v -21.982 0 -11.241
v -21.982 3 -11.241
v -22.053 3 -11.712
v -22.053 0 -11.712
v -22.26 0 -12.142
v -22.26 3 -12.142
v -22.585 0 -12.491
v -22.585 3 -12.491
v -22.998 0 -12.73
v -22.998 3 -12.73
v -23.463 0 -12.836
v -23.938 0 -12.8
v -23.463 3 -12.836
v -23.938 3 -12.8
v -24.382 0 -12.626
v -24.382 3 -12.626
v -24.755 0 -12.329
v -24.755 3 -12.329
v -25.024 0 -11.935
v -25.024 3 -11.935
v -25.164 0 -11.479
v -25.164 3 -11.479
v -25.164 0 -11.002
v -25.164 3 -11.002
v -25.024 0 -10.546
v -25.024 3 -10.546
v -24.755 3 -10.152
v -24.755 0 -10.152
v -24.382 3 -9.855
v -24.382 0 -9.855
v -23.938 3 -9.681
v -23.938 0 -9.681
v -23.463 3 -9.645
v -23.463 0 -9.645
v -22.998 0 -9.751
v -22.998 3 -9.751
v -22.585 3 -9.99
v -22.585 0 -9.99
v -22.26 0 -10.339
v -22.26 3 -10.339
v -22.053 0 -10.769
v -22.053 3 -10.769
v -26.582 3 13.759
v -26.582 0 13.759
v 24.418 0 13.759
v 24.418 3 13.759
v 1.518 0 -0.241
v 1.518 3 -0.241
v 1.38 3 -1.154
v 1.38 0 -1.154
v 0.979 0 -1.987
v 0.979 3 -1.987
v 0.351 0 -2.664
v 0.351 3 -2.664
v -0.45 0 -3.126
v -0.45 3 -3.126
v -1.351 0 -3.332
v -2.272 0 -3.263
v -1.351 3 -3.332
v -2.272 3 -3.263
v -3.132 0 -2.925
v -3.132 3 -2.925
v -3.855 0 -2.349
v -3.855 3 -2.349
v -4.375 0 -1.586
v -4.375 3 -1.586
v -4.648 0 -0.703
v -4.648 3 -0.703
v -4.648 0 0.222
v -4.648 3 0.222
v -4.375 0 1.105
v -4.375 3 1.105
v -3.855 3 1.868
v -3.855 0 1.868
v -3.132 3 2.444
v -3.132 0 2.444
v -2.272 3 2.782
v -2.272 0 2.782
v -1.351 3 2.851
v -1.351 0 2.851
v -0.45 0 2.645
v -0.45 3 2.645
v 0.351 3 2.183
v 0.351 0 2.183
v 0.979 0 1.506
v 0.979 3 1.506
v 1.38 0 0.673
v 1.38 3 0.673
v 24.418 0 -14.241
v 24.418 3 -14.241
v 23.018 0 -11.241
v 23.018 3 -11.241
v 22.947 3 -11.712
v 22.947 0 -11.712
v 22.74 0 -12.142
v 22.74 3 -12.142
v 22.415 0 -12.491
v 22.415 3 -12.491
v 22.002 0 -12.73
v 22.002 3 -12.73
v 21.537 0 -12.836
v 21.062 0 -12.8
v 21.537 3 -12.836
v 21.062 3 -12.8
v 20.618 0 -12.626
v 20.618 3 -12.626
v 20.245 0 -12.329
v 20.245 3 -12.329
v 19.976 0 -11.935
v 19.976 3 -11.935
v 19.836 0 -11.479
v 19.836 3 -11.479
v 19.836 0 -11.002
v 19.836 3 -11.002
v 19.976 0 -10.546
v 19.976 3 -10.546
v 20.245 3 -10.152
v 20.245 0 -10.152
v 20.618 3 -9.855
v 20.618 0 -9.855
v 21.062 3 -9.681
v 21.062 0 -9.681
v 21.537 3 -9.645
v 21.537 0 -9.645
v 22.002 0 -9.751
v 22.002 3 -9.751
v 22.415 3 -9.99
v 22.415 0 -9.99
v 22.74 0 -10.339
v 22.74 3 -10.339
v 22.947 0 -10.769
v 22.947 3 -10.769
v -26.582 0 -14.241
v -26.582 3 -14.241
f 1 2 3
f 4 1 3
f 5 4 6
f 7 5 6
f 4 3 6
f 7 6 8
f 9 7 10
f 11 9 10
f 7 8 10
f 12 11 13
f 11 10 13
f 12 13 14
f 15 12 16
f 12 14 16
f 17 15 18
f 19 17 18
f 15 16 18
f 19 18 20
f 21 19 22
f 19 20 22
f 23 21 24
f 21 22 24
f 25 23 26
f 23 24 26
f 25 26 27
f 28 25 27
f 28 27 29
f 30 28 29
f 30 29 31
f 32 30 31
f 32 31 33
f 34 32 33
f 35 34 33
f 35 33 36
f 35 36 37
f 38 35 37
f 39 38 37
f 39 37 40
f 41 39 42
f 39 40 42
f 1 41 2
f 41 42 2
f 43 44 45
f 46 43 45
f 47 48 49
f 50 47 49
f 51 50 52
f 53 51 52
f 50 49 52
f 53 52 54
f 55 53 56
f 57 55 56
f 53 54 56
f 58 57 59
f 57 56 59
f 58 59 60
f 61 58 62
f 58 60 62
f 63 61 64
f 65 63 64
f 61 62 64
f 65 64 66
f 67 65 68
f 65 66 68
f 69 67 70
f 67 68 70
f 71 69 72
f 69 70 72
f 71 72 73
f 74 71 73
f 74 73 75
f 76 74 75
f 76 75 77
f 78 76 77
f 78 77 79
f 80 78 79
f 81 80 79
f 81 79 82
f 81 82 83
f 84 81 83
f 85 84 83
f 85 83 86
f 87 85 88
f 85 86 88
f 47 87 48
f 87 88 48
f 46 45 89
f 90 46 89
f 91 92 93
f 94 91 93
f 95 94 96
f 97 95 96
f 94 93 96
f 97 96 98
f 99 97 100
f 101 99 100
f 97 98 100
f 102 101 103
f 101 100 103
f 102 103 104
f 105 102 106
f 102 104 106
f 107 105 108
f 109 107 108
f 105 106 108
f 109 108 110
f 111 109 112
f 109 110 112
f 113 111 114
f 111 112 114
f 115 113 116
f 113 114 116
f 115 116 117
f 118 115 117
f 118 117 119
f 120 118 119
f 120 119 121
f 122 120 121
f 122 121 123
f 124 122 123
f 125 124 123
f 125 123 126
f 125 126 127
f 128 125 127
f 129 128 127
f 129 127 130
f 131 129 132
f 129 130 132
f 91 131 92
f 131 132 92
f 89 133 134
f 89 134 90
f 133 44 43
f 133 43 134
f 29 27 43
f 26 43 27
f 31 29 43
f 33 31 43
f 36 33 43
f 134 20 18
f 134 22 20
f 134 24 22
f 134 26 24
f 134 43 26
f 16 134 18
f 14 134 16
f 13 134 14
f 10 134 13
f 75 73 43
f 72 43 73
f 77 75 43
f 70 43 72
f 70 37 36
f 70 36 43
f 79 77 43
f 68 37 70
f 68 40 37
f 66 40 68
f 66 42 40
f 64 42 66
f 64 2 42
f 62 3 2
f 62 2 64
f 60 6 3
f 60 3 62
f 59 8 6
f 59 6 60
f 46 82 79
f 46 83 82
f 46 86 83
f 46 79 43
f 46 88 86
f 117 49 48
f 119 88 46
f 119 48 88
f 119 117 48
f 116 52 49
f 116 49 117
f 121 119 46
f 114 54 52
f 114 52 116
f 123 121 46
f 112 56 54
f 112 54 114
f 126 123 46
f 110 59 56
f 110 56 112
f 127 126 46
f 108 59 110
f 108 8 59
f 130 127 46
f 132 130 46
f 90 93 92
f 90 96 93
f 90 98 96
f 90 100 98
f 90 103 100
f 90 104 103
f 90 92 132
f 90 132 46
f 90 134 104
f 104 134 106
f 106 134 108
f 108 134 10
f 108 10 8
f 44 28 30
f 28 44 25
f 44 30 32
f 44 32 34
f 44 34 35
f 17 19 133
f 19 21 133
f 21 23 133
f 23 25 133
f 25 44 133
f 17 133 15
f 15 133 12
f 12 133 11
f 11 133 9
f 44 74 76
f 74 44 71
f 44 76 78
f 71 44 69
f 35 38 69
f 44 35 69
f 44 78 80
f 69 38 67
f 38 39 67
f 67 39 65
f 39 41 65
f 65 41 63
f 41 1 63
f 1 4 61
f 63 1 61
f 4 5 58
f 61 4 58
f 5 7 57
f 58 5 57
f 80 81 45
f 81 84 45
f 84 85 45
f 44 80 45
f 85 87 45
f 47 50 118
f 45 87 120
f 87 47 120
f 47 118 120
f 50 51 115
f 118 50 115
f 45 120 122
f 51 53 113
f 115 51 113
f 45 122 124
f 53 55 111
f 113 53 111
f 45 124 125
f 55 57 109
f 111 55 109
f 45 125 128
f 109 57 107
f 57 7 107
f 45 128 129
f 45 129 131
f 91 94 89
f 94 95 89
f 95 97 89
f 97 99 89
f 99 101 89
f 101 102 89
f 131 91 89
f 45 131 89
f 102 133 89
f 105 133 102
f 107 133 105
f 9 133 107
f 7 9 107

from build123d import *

# Parameters (mm, degrees)
SKETCH1_W           = 51
SKETCH1_H           = 28
BOSS_EXTRUDE1_DEPTH = 3
SKETCH2_R           = 1.6
CUT_EXTRUDE1_DEPTH  = 3
SKETCH3_R           = 3.1
CUT_EXTRUDE2_DEPTH  = 3


with BuildPart() as part:
    # Sketch1 → Boss-Extrude1 (new body)
    with BuildSketch(Plane(origin=(0, 0, 0), x_dir=(1, 0, 0), z_dir=(0, 1, 0))):
        with Locations((-1.082278481, 0.240506329)):
            Rectangle(SKETCH1_W, SKETCH1_H)
    extrude(amount=BOSS_EXTRUDE1_DEPTH)

    # Sketch2 → Cut-Extrude1 (cut)
    with BuildSketch(Plane(origin=(0, 3, 0), x_dir=(1, 0, 0), z_dir=(0, 1, 0))):
        with Locations((-23.582278481, 11.240506329)):
            Circle(SKETCH2_R)
        with Locations((21.417721519, 11.240506329)):
            Circle(SKETCH2_R)
    extrude(amount=-CUT_EXTRUDE1_DEPTH, mode=Mode.SUBTRACT)

    # Sketch3 → Cut-Extrude2 (cut)
    with BuildSketch(Plane(origin=(0, 3, 0), x_dir=(1, 0, 0), z_dir=(0, 1, 0))):
        with Locations((-1.582278481, 0.240506329)):
            Circle(SKETCH3_R)
    extrude(amount=-CUT_EXTRUDE2_DEPTH, mode=Mode.SUBTRACT)


solid = part.part
